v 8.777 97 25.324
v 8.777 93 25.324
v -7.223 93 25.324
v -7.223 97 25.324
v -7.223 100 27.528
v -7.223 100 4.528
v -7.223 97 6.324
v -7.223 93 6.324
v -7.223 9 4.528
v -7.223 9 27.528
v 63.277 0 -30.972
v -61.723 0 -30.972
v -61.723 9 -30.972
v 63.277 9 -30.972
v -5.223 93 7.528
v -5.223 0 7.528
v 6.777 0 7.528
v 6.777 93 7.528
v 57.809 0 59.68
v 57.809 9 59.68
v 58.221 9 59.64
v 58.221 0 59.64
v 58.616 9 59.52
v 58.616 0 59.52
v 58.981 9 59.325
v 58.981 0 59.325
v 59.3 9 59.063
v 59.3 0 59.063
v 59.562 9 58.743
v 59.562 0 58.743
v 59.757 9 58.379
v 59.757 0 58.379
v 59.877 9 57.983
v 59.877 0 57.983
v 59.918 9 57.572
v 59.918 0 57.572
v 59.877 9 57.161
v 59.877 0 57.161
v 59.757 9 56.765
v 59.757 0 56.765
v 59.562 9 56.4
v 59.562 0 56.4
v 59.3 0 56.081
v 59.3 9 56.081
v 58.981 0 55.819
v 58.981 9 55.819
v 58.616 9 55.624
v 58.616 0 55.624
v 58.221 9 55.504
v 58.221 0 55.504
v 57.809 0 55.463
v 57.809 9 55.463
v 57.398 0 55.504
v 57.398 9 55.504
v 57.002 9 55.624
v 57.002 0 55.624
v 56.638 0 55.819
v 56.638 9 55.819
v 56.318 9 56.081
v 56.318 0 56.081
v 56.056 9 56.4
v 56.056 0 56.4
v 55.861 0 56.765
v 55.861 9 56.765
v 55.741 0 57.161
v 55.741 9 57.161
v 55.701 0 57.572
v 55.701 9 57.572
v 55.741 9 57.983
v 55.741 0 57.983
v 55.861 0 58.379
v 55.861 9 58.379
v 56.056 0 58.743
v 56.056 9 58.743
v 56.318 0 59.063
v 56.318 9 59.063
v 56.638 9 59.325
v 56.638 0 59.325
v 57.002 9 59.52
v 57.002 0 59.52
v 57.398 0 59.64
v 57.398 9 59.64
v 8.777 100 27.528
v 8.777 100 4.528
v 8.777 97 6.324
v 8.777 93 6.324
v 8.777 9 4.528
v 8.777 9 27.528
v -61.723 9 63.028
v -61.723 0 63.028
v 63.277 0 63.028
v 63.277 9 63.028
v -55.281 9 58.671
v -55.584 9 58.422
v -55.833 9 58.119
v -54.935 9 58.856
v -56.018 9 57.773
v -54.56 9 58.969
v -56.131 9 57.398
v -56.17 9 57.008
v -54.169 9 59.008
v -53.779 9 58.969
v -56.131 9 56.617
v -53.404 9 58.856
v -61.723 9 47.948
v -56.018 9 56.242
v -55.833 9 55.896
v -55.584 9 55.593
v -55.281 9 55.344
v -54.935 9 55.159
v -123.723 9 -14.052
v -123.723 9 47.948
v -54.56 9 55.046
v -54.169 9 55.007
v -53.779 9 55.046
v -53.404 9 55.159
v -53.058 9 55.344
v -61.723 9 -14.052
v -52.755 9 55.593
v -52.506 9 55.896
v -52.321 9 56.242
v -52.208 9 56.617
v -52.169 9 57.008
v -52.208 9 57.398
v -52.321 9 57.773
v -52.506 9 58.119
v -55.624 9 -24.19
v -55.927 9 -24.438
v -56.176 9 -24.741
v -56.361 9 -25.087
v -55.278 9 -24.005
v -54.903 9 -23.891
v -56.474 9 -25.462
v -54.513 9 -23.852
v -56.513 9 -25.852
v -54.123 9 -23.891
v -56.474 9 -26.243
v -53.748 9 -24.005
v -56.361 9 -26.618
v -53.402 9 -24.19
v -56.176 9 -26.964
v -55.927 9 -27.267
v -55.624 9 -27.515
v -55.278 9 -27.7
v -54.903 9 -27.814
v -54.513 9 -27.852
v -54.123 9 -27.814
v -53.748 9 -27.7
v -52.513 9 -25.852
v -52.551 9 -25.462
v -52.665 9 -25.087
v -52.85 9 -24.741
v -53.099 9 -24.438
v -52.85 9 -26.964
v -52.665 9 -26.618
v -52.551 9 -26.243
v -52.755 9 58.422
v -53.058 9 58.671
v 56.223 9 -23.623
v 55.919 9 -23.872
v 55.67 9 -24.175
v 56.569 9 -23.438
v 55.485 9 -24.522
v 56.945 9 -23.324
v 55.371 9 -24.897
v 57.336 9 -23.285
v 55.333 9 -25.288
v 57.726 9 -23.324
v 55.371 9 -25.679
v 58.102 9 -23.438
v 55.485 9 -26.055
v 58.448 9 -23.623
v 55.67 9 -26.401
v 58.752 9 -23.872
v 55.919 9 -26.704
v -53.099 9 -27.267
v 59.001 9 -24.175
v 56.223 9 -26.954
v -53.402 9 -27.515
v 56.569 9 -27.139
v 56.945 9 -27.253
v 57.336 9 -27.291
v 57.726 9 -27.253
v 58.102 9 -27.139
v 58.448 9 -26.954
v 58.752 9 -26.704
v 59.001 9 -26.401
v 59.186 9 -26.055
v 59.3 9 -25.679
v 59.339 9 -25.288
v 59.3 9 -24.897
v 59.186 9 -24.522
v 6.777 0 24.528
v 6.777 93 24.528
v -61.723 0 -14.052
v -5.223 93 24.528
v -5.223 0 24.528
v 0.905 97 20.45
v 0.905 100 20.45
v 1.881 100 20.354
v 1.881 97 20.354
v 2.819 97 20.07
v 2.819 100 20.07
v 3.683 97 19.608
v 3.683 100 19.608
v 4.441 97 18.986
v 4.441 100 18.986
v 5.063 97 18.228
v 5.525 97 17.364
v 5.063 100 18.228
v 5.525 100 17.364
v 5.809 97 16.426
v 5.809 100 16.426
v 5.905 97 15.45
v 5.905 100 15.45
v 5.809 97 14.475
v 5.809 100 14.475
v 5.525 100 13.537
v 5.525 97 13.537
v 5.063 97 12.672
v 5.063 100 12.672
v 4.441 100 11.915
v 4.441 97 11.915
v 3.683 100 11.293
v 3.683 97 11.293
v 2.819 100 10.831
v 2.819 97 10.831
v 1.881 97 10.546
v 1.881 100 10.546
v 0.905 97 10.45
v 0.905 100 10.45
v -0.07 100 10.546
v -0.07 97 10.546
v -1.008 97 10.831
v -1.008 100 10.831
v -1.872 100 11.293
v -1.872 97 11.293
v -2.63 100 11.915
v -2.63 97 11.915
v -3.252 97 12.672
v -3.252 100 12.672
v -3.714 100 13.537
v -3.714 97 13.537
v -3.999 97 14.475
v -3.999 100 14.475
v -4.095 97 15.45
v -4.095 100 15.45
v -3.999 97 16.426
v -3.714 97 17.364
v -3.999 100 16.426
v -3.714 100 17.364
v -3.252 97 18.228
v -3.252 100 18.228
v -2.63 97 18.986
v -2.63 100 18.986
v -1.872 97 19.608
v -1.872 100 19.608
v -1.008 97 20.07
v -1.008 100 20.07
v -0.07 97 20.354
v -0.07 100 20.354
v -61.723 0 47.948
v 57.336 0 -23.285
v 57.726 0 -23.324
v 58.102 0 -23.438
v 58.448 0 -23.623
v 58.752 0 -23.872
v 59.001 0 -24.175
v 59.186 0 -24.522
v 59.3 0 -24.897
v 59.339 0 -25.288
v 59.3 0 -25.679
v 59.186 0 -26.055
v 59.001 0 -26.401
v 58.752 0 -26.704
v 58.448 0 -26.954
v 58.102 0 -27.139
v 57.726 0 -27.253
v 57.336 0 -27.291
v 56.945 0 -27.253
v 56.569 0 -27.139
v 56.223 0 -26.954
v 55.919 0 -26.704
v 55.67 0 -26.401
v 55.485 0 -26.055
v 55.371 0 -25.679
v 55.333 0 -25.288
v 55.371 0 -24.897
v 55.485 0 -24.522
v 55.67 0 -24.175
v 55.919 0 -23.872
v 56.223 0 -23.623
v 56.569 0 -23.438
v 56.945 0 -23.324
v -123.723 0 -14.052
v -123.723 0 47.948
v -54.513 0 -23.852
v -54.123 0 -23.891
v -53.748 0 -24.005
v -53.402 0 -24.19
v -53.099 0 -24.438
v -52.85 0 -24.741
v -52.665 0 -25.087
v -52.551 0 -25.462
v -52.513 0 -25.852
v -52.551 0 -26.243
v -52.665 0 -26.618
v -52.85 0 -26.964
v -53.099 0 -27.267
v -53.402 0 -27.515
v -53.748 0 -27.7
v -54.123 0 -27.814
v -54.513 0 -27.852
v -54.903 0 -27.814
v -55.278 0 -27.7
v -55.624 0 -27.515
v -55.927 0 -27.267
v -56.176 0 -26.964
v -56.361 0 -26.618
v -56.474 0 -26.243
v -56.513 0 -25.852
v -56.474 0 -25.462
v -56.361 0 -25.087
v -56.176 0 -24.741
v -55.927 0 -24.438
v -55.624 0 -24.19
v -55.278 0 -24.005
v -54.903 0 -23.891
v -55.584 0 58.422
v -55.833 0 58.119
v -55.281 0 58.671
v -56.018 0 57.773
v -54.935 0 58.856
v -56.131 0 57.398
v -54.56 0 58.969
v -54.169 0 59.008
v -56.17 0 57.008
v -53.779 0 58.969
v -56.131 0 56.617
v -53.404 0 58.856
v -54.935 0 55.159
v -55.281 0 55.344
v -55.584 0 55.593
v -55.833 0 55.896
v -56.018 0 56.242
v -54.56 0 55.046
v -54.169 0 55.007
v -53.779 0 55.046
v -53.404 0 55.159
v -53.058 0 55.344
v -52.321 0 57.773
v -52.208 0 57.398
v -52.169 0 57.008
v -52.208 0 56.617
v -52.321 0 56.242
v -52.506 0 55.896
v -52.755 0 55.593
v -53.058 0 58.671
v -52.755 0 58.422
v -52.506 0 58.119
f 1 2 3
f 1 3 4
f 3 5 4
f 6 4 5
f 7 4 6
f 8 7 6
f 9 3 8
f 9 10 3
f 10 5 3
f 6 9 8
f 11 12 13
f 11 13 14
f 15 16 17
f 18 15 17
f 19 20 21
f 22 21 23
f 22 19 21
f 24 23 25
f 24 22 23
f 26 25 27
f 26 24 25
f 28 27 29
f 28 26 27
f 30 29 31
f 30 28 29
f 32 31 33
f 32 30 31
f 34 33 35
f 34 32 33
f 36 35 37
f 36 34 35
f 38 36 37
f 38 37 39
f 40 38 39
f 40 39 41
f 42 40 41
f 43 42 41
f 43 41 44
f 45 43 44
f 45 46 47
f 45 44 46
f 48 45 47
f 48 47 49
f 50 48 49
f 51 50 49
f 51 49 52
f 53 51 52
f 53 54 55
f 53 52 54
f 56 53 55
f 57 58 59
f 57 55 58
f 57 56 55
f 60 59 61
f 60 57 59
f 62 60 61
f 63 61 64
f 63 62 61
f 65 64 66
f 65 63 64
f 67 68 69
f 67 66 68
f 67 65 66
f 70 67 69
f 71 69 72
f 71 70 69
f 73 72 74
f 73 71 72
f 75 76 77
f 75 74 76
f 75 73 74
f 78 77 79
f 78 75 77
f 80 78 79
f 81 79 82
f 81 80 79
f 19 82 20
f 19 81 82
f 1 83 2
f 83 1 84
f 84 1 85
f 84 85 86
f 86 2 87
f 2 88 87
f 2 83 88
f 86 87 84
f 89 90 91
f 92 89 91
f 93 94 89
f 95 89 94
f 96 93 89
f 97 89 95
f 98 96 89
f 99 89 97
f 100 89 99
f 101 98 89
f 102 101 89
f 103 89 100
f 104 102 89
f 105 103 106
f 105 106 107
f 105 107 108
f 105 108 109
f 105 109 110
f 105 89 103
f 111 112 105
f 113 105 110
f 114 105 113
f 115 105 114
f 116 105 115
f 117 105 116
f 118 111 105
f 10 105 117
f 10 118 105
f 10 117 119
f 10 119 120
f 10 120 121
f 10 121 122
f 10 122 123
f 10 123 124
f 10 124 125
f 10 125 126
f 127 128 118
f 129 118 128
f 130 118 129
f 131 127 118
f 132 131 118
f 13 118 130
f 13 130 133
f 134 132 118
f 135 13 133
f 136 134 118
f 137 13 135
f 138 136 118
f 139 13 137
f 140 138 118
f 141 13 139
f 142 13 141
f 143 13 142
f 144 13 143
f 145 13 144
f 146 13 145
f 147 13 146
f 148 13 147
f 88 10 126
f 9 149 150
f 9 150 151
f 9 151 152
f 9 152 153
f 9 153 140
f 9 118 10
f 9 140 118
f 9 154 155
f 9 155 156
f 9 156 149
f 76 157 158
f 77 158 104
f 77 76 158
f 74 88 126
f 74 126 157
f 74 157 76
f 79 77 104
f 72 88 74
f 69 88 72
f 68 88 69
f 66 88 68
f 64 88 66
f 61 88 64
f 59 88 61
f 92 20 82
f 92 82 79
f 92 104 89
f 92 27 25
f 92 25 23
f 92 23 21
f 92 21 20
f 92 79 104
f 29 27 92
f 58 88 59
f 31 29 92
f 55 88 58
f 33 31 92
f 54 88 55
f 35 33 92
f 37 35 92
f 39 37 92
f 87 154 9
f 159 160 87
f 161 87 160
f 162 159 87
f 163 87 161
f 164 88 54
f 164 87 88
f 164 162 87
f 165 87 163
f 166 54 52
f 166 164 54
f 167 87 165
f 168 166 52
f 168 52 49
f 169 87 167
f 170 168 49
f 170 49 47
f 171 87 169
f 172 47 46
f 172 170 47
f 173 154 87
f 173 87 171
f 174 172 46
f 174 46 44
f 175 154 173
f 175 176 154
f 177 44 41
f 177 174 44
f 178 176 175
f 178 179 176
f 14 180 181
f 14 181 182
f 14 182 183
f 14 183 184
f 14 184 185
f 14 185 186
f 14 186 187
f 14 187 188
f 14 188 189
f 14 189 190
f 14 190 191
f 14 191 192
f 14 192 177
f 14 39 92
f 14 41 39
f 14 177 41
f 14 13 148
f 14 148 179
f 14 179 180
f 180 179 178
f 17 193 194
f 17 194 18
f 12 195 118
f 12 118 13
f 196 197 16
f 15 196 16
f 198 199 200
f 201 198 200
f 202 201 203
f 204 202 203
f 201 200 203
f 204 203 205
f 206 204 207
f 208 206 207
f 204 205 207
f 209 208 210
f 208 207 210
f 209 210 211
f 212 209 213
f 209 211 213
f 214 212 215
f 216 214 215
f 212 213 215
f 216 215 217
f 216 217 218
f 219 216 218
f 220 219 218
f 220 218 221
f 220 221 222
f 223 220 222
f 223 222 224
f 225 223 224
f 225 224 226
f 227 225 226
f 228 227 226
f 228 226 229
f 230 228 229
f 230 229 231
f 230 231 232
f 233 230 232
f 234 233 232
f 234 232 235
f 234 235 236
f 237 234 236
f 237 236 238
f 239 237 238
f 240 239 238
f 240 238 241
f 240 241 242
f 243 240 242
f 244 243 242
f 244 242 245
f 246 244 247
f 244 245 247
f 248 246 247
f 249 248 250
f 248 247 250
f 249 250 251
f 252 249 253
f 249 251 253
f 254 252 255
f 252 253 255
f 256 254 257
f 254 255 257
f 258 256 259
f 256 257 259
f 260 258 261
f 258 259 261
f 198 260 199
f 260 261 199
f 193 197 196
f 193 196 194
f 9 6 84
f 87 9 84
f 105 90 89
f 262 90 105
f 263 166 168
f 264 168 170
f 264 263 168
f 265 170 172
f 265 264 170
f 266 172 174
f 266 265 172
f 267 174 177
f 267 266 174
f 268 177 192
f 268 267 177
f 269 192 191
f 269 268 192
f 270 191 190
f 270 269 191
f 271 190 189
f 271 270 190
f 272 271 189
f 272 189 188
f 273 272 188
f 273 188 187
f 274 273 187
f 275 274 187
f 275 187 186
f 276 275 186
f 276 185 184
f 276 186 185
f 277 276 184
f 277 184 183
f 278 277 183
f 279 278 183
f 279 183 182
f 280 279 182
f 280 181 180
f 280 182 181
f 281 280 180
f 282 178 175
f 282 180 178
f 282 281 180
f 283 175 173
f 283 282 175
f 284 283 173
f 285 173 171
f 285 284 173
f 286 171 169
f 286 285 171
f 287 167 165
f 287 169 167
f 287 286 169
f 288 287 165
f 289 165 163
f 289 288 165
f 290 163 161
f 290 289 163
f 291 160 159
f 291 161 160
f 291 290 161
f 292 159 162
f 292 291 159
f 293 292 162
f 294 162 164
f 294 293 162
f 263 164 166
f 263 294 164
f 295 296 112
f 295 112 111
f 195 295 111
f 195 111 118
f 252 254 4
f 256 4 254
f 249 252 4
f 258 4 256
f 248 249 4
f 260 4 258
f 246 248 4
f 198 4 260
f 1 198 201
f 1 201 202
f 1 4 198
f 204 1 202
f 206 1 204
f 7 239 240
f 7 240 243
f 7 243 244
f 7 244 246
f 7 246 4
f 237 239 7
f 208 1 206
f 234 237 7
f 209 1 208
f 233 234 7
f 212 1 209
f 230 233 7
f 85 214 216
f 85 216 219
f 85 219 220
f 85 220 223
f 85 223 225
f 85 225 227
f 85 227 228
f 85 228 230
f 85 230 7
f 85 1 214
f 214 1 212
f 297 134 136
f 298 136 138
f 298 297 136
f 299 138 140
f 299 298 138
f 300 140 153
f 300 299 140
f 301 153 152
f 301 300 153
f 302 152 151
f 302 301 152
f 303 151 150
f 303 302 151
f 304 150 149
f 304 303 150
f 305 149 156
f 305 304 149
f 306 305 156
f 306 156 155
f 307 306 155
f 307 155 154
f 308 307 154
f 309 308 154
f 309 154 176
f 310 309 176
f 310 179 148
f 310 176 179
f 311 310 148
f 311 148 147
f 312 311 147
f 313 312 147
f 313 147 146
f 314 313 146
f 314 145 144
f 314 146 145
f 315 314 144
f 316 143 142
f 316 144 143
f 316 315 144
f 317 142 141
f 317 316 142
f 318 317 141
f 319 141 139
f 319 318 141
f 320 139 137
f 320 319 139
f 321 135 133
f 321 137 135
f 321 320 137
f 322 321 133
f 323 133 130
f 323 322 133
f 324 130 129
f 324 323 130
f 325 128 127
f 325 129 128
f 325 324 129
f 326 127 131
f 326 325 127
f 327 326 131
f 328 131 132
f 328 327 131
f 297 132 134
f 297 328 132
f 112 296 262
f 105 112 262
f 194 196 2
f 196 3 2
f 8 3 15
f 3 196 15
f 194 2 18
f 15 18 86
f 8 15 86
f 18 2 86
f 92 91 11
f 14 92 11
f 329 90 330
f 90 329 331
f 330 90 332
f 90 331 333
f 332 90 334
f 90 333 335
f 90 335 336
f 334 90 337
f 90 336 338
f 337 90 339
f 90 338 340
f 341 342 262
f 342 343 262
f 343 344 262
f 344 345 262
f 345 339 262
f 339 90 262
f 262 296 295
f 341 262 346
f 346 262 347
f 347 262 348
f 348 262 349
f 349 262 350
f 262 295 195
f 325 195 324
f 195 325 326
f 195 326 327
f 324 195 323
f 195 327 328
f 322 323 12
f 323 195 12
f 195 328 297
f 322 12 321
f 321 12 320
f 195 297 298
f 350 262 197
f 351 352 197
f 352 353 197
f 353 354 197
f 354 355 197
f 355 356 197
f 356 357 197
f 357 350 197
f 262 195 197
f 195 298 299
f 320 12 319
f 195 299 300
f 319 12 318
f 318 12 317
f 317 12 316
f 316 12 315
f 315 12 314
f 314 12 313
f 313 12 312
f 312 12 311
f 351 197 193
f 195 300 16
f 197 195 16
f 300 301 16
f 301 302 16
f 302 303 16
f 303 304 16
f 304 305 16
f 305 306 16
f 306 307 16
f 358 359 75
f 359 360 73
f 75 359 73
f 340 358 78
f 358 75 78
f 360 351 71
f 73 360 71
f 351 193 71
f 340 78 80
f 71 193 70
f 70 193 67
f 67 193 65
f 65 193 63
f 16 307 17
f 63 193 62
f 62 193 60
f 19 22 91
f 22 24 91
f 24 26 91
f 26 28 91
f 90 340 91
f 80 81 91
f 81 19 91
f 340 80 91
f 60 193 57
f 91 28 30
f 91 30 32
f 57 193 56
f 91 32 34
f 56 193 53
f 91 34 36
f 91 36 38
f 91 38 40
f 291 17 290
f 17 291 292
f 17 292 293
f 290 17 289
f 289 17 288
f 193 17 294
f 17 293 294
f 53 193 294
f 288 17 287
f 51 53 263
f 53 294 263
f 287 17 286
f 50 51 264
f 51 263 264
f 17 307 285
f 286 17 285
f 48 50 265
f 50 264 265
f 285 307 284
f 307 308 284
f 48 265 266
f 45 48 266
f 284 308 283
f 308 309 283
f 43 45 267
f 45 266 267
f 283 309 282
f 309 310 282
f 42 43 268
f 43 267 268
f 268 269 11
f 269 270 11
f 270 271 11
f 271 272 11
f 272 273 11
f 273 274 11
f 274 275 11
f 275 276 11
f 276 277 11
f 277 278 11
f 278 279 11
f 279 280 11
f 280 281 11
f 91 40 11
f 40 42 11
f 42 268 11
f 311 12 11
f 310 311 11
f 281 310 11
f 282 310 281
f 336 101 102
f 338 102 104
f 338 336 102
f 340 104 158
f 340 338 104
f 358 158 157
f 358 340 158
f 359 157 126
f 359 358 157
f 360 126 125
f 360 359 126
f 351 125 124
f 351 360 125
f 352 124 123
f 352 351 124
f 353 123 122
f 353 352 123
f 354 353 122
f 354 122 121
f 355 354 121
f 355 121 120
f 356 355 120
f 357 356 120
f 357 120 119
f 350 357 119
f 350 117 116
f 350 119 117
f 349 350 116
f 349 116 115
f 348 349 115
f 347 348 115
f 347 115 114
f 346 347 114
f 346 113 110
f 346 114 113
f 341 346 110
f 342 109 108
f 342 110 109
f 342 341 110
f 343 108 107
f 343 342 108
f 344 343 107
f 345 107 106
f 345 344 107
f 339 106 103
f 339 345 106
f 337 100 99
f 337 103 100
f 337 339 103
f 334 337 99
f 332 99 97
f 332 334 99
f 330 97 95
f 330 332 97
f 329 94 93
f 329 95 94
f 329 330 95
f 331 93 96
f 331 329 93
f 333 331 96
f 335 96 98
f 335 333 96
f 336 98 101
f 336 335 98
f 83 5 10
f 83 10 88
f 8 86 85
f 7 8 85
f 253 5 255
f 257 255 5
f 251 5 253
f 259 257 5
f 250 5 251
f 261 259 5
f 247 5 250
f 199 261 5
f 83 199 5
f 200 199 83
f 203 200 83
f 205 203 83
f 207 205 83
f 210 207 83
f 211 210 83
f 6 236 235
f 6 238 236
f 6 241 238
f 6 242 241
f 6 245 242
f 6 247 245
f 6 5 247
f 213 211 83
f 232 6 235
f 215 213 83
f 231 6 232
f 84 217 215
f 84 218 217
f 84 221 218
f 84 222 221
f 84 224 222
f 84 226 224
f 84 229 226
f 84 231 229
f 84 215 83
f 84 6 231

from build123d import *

# Parameters (mm, degrees)
SKETCH1_W           = 125
SKETCH1_H           = 94
BOSS_EXTRUDE2_DEPTH = 9
SKETCH2_W           = 16
SKETCH2_H           = 23
BOSS_EXTRUDE4_DEPTH = 100
SKETCH4_W           = 12
SKETCH4_H           = 17
CUT_EXTRUDE1_DEPTH  = 96.5
SKETCH5_R           = 5
CUT_EXTRUDE2_DEPTH  = 100
CUT_EXTRUDE3_START  = 8.777087
SKETCH6_W           = 19
SKETCH6_H           = 4
CUT_EXTRUDE3_DEPTH  = 100
SKETCH7_R           = 2
SKETCH7_R_2         = 2.002973214
SKETCH7_R_3         = 2.108586534
SKETCH7_R_4         = 2.000351704
CUT_EXTRUDE4_DEPTH  = 100
SKETCH8_W           = 62
SKETCH8_H           = 62
BOSS_EXTRUDE5_DEPTH = 9


with BuildPart() as part:
    # Sketch1 → Boss-Extrude2 (new body)
    with BuildSketch(Plane(origin=(0, 0, 0), x_dir=(1, 0, 0), z_dir=(0, 1, 0))):
        with Locations((0.777087034, -16.027531083)):
            Rectangle(SKETCH1_W, SKETCH1_H)
    extrude(amount=BOSS_EXTRUDE2_DEPTH)

    # Sketch2 → Boss-Extrude4 (add)
    with BuildSketch(Plane(origin=(0, 0, 0), x_dir=(1, 0, 0), z_dir=(0, 1, 0))):
        with Locations((0.777087034, -16.027531083)):
            Rectangle(SKETCH2_W, SKETCH2_H)
    extrude(amount=BOSS_EXTRUDE4_DEPTH)

    # Sketch4 → Cut-Extrude1 (cut)
    with BuildSketch(Plane(origin=(0, 0, 0), x_dir=(1, 0, 0), z_dir=(0, 1, 0))):
        with Locations((0.777087034, -16.027531083)):
            Rectangle(SKETCH4_W, SKETCH4_H)
    extrude(amount=CUT_EXTRUDE1_DEPTH, mode=Mode.SUBTRACT)

    # Sketch5 → Cut-Extrude2 (cut)
    with BuildSketch(Plane(origin=(0, 100, 0), x_dir=(1, 0, 0), z_dir=(0, 1, 0))):
        with Locations(Location((0.905359977, -15.45030284, 0), (0, 0, 270))):
            Circle(SKETCH5_R)
    extrude(amount=-CUT_EXTRUDE2_DEPTH, mode=Mode.SUBTRACT)

    # Sketch6 → Cut-Extrude3 (cut)
    with BuildSketch(Plane(origin=(0, 0, 0), x_dir=(0, 0, -1), z_dir=(1, 0, 0)).offset(CUT_EXTRUDE3_START)):
        with Locations((-15.823546724, 95)):
            Rectangle(SKETCH6_W, SKETCH6_H)
    extrude(amount=-CUT_EXTRUDE3_DEPTH, mode=Mode.SUBTRACT)

    # Sketch7 → Cut-Extrude4 (cut)
    with BuildSketch(Plane(origin=(0, 0, 0), x_dir=(1, 0, 0), z_dir=(0, 1, 0))):
        with Locations(Location((-54.512912966, 25.852468917, 0), (0, 0, 270))):
            Circle(SKETCH7_R)
        with Locations(Location((57.335663159, 25.288094206, 0), (0, 0, 270))):
            Circle(SKETCH7_R_2)
        with Locations(Location((57.809152834, -57.571905794, 0), (0, 0, 270))):
            Circle(SKETCH7_R_3)
        with Locations(Location((-54.169424944, -57.007531083, 0), (0, 0, 270))):
            Circle(SKETCH7_R_4)
    extrude(amount=CUT_EXTRUDE4_DEPTH, mode=Mode.SUBTRACT)

    # Sketch8 → Boss-Extrude5 (add)
    with BuildSketch(Plane(origin=(0, 0, 0), x_dir=(1, 0, 0), z_dir=(0, 1, 0))):
        with Locations((-92.722912966, -16.947525928)):
            Rectangle(SKETCH8_W, SKETCH8_H)
    extrude(amount=BOSS_EXTRUDE5_DEPTH)


solid = part.part
